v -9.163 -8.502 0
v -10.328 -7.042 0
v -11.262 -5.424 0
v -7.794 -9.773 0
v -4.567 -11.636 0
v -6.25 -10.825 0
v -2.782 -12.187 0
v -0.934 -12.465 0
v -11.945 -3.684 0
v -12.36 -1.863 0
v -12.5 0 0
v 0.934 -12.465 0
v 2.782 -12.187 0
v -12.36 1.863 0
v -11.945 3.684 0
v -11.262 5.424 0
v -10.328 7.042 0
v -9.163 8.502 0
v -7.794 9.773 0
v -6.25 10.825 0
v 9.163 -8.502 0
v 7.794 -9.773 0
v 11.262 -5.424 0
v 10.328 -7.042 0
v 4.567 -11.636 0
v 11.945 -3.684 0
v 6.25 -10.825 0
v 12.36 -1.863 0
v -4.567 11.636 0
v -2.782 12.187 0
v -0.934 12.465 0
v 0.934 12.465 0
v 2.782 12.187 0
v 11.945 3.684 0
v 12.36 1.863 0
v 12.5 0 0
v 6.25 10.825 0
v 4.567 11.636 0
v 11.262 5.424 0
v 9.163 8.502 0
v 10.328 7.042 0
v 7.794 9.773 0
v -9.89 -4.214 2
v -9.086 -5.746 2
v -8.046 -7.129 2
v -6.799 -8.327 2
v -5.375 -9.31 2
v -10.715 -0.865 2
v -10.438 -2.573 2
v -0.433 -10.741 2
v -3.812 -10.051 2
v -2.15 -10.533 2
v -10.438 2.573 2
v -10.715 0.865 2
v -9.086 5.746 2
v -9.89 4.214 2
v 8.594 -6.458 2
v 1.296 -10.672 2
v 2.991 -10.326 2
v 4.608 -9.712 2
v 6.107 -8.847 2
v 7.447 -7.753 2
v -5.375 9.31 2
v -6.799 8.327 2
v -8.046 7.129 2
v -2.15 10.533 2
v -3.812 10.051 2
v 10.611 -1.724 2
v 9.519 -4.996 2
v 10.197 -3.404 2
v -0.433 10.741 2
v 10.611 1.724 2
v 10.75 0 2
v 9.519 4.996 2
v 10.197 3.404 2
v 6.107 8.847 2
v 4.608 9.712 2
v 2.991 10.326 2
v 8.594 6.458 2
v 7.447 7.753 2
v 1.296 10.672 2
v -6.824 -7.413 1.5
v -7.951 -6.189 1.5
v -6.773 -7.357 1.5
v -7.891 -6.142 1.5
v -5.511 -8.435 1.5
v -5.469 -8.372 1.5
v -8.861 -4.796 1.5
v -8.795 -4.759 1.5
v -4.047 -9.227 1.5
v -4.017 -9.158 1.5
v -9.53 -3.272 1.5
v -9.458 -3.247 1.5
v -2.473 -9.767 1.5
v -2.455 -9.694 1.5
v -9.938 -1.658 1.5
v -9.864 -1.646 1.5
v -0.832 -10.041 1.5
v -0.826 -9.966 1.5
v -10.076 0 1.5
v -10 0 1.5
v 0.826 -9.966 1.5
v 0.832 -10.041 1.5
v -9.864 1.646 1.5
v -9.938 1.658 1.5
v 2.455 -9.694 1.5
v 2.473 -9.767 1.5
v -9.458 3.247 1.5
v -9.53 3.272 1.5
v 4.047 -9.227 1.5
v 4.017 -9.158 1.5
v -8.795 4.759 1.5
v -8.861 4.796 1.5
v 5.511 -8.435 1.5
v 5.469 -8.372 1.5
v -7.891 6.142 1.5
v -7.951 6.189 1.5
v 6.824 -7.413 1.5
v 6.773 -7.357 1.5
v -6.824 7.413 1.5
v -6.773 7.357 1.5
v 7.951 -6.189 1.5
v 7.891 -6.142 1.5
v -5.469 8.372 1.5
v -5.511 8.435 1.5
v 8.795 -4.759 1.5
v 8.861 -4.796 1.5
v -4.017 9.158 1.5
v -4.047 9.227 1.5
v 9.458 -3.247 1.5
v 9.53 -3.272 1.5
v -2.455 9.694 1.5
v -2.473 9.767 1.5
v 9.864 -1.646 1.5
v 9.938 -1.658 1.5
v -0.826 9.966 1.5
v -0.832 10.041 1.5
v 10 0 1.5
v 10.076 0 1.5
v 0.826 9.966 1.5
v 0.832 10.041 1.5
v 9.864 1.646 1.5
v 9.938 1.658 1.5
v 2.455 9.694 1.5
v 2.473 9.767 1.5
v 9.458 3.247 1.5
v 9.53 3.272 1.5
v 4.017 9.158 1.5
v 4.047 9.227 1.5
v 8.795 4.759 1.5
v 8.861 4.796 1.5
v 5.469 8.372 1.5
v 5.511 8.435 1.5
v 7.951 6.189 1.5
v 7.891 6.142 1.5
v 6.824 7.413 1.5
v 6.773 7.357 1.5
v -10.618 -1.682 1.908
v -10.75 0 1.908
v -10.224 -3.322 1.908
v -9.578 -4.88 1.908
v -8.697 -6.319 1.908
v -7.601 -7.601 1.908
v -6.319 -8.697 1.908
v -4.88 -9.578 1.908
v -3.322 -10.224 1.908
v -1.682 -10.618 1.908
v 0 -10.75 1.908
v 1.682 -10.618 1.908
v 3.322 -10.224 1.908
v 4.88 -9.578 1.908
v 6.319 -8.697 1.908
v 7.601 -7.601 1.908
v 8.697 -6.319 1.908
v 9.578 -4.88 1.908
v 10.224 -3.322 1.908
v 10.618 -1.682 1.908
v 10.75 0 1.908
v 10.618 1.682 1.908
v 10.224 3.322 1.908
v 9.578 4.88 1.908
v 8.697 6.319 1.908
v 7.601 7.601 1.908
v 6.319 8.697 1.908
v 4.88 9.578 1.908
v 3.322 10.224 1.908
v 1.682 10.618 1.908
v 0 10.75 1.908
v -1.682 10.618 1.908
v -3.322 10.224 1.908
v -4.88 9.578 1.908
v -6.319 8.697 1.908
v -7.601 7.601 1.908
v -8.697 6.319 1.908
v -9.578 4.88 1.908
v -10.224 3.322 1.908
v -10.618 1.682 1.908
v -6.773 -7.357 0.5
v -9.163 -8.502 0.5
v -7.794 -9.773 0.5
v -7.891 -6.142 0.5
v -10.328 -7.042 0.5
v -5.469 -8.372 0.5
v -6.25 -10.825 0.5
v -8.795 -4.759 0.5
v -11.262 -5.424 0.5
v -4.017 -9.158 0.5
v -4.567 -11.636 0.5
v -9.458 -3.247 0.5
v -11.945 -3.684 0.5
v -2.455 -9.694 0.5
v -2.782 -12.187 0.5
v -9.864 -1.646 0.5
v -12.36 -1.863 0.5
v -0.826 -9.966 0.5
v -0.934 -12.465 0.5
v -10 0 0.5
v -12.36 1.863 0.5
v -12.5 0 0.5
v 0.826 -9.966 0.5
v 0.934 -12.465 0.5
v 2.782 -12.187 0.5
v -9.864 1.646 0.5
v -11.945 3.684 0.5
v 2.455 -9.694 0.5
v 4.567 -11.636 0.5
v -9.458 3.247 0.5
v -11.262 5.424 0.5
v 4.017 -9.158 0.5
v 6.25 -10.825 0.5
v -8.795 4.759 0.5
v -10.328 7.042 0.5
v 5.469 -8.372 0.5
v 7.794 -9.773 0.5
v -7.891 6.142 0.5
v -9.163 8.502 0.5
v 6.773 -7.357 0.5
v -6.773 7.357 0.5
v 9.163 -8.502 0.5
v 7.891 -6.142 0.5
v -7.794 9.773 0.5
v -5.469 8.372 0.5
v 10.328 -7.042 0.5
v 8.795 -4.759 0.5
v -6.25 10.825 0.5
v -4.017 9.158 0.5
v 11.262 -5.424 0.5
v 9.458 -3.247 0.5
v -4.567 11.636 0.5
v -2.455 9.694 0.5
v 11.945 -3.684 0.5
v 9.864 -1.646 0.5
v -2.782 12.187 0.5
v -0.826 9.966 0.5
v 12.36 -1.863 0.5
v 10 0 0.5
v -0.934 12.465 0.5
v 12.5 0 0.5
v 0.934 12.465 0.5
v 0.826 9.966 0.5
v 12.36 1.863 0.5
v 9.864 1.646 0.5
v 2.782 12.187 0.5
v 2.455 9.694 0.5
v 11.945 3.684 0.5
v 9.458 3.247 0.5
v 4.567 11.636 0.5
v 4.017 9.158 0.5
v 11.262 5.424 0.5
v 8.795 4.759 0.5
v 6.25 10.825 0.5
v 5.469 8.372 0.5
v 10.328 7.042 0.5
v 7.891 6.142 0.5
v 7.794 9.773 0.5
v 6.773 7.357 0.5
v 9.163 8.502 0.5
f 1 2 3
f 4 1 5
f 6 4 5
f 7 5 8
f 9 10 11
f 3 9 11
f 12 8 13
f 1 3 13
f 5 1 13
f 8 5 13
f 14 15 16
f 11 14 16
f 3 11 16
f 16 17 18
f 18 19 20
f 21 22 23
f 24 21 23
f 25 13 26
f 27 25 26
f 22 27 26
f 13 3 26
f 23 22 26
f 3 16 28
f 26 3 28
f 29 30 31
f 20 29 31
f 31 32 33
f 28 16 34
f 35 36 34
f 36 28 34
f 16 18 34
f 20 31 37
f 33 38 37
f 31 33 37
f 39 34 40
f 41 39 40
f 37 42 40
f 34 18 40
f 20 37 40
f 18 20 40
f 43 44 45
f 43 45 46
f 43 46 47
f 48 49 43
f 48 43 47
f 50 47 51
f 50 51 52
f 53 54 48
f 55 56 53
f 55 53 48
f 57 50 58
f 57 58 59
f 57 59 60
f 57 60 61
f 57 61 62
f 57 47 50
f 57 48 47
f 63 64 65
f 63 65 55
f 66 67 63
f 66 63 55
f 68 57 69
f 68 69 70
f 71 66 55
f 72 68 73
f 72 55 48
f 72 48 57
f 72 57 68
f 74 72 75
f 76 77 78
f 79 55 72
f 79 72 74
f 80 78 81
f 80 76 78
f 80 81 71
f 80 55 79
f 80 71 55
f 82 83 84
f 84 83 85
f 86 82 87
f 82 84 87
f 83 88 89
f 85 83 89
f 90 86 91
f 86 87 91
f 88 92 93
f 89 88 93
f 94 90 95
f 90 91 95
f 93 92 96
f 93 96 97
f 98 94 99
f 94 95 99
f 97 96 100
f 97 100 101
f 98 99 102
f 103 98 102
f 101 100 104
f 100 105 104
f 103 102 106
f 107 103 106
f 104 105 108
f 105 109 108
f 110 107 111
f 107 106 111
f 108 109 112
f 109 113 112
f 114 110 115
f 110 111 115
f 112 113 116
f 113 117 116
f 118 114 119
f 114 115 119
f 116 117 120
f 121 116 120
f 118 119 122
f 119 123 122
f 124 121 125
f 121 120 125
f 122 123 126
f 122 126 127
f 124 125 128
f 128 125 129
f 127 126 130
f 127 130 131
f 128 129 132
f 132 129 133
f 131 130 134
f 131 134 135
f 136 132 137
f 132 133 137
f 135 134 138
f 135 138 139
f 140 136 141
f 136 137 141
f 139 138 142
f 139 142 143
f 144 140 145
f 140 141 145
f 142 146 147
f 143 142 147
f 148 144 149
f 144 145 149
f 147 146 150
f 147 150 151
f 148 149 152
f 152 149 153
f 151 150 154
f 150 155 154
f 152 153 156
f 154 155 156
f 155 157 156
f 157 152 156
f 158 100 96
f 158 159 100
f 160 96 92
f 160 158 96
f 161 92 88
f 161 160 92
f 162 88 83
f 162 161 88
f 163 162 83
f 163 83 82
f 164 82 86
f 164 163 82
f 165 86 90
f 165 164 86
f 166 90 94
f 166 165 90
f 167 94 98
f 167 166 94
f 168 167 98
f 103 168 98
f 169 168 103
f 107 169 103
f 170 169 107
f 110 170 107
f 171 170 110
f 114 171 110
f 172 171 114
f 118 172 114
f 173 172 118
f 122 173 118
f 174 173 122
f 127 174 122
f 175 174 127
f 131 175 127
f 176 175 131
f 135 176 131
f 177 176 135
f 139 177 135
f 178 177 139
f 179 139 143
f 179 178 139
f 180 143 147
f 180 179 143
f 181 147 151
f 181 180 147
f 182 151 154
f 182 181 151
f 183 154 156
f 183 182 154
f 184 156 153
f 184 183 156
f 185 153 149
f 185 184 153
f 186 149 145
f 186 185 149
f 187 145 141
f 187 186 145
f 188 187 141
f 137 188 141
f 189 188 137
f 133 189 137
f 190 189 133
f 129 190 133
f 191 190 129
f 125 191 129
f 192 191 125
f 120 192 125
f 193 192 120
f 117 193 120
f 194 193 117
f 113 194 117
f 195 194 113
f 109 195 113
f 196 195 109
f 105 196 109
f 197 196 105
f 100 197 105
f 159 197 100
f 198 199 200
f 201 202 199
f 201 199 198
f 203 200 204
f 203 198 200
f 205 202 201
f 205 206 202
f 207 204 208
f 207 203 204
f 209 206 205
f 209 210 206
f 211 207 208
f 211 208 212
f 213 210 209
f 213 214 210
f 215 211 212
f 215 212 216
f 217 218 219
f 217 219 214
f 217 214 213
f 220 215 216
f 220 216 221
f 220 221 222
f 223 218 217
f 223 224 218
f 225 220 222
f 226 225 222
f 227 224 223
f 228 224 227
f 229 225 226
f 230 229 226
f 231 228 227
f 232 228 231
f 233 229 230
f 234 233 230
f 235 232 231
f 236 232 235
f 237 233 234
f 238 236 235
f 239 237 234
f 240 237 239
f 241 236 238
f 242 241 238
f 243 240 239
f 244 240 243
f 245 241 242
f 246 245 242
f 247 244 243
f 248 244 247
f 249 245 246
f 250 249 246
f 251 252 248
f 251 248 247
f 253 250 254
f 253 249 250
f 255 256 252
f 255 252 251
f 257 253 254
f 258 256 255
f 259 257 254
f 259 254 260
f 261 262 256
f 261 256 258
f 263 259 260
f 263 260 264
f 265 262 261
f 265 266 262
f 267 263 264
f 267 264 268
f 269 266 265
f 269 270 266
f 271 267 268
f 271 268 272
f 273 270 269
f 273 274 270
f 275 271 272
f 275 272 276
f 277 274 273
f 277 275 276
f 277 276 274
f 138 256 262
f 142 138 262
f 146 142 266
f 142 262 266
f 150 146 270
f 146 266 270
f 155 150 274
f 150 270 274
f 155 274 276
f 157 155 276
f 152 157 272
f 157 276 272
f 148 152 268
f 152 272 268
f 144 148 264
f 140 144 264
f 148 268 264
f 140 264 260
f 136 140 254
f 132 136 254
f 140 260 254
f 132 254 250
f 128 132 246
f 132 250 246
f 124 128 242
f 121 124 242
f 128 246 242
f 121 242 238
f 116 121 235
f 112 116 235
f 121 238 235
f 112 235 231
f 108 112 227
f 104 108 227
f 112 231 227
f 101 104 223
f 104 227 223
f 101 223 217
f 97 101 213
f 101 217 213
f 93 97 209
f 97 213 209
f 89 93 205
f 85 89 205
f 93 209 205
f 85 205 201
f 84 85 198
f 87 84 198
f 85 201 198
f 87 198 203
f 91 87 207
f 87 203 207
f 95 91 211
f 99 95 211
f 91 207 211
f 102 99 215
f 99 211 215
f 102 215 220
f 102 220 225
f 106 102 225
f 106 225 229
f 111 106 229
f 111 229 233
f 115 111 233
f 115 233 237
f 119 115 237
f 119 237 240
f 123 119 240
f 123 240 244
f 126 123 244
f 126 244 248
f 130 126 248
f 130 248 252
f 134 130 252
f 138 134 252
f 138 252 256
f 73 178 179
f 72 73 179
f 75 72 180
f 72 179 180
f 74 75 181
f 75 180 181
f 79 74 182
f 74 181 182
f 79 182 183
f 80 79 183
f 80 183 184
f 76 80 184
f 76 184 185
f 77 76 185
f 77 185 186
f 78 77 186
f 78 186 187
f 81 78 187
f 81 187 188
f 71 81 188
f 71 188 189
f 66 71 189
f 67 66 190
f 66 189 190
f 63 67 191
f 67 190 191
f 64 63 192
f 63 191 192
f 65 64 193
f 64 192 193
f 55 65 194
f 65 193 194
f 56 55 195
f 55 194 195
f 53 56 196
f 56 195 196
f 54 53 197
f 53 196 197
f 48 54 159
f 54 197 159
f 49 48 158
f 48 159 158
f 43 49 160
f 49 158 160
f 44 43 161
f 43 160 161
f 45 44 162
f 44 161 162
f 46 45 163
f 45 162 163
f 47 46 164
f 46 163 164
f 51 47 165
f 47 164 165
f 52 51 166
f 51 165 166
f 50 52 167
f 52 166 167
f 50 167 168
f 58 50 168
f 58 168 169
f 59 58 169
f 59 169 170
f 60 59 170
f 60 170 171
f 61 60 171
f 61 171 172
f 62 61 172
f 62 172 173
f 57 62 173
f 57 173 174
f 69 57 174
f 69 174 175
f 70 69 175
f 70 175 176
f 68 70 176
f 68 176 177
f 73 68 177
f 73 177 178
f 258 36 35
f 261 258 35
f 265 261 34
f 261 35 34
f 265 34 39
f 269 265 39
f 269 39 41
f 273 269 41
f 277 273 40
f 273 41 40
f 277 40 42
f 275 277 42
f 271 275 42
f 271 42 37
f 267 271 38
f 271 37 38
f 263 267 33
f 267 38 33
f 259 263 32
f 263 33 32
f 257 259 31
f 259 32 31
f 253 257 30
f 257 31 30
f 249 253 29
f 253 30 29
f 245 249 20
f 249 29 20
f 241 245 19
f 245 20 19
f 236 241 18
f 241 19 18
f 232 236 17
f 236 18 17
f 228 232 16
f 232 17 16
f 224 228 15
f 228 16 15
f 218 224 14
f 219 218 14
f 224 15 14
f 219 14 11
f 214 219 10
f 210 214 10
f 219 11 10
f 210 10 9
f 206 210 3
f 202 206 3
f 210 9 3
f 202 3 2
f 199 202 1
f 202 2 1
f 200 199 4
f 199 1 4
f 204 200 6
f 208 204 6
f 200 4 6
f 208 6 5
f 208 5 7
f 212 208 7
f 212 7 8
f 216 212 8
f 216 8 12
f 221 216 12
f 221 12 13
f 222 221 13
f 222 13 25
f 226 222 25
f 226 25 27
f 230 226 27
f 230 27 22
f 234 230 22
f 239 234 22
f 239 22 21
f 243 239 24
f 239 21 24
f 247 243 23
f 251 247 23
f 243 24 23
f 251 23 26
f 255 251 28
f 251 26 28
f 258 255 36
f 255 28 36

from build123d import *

# Parameters (mm, degrees)
F0_R     = 12.5
F1_DEPTH = 0.5
F2_R     = 10
F3_DEPTH = 1
F4_R     = 10.75
F4_R_2   = 10
F5_DEPTH = 0.5


with BuildPart() as f1:
    # F0 (on Top) → F1 (new body)
    with BuildSketch(Plane.XY):
        Circle(F0_R)
    extrude(amount=F1_DEPTH)

    # F2 (on face) → F3 (join)
    with BuildSketch(Plane.XY.offset(0.5)):
        Circle(F2_R)
    extrude(amount=F3_DEPTH)

    # F4 (on face) → F5 (join)
    with BuildSketch(Plane.XY.offset(1.5)):
        Circle(F4_R)
        Circle(F4_R_2, mode=Mode.SUBTRACT)
        Circle(F4_R_2)
    extrude(amount=F5_DEPTH)

    # F6 (on Front) → F7 (revolve, cut)
    with BuildSketch(Plane.XZ):
        Polygon((-10.8236325905, 1.4508630848), (-10.0277131423, 1.4709283132), (-10.8236325905, 1.9524930976), align=None)
    revolve(axis=Axis((0, 0, 2.0342625212), (0, 0, 1)), mode=Mode.SUBTRACT)


solid = f1.part
